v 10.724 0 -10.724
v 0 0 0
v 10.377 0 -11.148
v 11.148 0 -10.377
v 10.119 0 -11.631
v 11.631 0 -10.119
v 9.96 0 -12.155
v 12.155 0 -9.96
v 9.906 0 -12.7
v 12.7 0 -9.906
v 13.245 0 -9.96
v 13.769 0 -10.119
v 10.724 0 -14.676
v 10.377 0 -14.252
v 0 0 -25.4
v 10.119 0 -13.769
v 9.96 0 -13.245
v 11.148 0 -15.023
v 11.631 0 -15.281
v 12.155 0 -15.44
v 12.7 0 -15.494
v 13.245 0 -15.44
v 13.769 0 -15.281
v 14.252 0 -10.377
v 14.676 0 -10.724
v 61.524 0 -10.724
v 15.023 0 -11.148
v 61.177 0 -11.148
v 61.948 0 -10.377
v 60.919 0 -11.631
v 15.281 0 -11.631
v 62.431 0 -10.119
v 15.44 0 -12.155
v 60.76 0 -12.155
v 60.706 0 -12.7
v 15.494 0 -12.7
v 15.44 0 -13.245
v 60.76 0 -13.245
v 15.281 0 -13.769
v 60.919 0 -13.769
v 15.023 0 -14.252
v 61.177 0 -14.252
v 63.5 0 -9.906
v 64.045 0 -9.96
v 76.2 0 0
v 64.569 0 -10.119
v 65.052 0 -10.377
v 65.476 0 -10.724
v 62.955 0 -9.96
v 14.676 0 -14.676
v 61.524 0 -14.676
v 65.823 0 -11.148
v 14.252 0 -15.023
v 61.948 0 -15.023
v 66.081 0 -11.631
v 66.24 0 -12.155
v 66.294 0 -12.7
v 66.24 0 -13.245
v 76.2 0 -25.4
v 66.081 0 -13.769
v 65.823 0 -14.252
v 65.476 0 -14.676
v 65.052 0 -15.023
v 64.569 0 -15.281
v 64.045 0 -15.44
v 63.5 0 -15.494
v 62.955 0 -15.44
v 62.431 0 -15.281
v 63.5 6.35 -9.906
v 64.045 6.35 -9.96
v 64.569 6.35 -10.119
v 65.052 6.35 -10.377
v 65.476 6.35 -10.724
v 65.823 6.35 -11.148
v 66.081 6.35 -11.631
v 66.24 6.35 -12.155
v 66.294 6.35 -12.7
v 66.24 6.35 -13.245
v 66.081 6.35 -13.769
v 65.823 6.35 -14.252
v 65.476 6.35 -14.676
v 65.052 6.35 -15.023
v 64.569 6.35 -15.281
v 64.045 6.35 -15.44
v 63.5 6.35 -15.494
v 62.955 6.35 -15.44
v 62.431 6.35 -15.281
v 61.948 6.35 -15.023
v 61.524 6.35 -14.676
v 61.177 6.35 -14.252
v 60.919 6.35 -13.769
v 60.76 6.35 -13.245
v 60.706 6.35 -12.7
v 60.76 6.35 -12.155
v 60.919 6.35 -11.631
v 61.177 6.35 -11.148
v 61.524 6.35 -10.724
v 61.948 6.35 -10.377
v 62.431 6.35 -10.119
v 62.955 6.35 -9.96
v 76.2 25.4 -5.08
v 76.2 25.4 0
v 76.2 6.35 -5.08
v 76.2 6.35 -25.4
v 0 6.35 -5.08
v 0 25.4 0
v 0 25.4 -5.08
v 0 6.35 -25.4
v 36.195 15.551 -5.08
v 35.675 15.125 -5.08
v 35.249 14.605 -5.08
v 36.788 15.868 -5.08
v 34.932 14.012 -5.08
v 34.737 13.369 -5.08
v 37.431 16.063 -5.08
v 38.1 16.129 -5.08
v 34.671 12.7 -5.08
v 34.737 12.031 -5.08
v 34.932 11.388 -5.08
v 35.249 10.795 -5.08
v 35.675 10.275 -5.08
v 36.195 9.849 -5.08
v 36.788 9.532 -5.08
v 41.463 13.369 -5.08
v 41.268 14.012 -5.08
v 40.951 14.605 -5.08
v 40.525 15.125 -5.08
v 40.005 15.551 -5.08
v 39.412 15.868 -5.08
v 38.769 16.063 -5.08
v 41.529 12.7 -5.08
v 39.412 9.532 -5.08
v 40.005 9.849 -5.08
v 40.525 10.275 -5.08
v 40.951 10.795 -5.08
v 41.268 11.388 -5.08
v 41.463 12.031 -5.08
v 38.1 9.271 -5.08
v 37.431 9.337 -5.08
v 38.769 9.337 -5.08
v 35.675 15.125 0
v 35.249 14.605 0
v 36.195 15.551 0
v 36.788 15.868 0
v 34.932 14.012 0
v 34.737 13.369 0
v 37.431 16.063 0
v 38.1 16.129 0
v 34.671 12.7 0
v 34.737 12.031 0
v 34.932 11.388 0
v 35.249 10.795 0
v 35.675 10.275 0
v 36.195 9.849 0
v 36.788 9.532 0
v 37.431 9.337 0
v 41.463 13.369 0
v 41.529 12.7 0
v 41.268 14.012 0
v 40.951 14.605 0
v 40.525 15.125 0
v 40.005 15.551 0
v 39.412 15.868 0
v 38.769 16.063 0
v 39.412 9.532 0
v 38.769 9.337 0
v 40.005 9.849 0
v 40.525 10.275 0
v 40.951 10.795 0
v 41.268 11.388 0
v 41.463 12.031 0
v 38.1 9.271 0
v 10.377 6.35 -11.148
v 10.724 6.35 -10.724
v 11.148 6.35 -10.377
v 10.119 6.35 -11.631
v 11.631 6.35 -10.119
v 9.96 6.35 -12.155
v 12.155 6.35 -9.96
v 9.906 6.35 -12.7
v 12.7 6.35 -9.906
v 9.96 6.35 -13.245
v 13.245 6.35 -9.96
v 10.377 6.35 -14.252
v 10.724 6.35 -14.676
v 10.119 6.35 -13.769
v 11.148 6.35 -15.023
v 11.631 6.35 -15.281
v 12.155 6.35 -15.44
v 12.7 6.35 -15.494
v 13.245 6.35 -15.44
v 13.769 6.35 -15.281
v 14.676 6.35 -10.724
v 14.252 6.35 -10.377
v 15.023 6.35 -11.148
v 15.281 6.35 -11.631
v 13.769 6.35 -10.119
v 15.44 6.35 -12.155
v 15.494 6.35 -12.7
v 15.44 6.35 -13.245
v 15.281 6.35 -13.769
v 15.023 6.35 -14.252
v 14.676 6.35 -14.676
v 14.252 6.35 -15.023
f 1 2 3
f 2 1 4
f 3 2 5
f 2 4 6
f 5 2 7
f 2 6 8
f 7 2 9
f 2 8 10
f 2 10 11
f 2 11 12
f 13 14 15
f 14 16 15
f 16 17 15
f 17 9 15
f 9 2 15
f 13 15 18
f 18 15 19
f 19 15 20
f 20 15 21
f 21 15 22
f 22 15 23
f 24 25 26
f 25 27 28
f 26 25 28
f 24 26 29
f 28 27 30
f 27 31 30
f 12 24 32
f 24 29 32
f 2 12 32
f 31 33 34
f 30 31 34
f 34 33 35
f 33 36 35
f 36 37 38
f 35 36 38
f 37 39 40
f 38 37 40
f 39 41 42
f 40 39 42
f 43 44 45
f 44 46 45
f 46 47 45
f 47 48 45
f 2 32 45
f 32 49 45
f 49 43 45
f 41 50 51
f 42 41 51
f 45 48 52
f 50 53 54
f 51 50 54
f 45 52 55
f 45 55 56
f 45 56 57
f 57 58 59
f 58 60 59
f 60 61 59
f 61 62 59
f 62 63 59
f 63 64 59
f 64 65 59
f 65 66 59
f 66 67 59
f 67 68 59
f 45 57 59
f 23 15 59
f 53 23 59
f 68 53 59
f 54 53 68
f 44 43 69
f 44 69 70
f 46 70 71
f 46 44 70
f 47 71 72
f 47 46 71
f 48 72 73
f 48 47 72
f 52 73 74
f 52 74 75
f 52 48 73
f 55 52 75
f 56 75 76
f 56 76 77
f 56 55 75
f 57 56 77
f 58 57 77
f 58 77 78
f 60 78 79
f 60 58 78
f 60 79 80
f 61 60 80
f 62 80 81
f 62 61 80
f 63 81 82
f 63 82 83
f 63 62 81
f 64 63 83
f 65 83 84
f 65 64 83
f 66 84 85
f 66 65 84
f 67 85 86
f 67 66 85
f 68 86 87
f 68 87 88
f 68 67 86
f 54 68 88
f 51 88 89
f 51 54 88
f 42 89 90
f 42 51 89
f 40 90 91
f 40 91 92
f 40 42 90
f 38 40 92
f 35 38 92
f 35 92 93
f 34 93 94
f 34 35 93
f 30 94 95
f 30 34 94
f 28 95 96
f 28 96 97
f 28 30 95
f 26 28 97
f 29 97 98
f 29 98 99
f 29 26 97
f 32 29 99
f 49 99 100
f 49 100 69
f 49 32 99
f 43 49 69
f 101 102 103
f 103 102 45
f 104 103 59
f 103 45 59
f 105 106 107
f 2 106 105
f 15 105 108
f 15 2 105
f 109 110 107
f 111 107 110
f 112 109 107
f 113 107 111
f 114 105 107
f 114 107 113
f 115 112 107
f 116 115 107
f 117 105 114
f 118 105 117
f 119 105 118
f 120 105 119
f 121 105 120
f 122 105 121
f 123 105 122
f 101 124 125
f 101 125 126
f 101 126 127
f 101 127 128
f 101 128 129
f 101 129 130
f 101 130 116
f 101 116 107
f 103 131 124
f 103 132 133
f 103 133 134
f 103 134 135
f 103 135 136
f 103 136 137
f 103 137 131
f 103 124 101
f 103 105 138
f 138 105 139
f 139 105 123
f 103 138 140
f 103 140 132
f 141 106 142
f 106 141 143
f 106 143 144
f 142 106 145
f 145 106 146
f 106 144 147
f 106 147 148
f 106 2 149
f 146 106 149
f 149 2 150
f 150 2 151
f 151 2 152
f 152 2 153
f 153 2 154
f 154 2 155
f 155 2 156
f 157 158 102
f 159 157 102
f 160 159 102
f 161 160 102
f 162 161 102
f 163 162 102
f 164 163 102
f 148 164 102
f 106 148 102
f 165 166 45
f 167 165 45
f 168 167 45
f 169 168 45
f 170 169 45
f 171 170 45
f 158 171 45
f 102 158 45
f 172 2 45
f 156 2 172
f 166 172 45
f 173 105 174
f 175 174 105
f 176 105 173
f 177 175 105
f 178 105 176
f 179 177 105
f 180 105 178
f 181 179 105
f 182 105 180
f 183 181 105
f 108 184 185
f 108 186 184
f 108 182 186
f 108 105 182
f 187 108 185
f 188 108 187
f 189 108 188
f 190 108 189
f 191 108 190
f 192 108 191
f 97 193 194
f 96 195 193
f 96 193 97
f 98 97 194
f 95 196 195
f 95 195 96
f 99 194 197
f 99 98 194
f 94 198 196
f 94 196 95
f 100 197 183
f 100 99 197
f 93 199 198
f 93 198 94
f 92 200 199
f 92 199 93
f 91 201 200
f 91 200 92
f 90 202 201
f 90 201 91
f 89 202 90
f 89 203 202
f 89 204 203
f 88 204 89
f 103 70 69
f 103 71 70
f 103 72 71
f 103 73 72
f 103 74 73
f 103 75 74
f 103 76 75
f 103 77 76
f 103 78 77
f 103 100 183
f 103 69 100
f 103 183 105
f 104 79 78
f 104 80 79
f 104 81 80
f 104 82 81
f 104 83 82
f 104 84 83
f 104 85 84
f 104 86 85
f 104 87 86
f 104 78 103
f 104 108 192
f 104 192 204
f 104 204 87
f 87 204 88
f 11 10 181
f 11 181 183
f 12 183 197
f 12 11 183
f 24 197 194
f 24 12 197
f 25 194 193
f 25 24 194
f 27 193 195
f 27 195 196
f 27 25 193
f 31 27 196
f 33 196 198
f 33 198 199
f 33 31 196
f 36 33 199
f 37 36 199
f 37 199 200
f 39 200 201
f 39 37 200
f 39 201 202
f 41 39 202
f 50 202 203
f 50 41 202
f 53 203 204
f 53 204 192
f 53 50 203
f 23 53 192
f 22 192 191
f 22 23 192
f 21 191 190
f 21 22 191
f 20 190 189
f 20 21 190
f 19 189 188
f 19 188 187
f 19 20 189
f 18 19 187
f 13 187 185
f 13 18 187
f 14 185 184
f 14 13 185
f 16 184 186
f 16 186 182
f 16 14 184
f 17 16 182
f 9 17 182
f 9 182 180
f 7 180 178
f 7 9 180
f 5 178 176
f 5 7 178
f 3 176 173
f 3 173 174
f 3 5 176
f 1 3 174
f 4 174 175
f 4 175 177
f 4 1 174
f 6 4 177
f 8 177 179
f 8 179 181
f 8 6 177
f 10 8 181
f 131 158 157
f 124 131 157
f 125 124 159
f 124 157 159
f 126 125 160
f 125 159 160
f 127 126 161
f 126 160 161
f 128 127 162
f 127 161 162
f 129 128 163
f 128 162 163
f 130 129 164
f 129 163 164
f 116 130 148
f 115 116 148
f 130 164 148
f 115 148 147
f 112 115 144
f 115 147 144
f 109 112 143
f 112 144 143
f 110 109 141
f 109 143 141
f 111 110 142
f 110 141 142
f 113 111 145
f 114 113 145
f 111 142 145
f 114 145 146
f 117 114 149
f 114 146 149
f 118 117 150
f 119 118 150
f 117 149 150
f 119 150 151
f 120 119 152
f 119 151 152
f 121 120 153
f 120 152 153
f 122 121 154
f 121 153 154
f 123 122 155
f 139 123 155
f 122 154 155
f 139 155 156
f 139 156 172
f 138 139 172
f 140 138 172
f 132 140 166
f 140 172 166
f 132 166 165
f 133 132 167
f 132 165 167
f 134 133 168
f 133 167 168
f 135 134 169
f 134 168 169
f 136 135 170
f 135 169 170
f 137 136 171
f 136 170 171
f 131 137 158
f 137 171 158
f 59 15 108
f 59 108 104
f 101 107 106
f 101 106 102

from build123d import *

# Parameters (mm, degrees)
SKETCH1_W           = 76.2
SKETCH1_H           = 25.4
SKETCH1_R           = 2.794
BOSS_EXTRUDE1_DEPTH = 6.35
SKETCH2_W           = 76.2
SKETCH2_H           = 5.08
BOSS_EXTRUDE2_DEPTH = 19.05
SKETCH3_R           = 3.429
CUT_EXTRUDE1_DEPTH  = 5.08


with BuildPart() as part:
    # Sketch1 → Boss-Extrude1 (new body)
    with BuildSketch(Plane(origin=(0, 0, 0), x_dir=(1, 0, 0), z_dir=(0, 1, 0))):
        with Locations((38.1, 12.7)):
            Rectangle(SKETCH1_W, SKETCH1_H)
        with Locations(Location((63.5, 12.7, 0), (0, 0, 270))):
            Circle(SKETCH1_R, mode=Mode.SUBTRACT)
        with Locations(Location((12.7, 12.7, 0), (0, 0, 270))):
            Circle(SKETCH1_R, mode=Mode.SUBTRACT)
    extrude(amount=BOSS_EXTRUDE1_DEPTH)

    # Sketch2 → Boss-Extrude2 (add)
    with BuildSketch(Plane(origin=(0, 6.35, 0), x_dir=(1, 0, 0), z_dir=(0, 1, 0))):
        with Locations((38.1, 2.54)):
            Rectangle(SKETCH2_W, SKETCH2_H)
    extrude(amount=BOSS_EXTRUDE2_DEPTH)

    # Sketch3 → Cut-Extrude1 (cut)
    with BuildSketch(Plane.XY):
        with Locations((38.1, 12.7)):
            Circle(SKETCH3_R)
    extrude(amount=-CUT_EXTRUDE1_DEPTH, mode=Mode.SUBTRACT)


solid = part.part
